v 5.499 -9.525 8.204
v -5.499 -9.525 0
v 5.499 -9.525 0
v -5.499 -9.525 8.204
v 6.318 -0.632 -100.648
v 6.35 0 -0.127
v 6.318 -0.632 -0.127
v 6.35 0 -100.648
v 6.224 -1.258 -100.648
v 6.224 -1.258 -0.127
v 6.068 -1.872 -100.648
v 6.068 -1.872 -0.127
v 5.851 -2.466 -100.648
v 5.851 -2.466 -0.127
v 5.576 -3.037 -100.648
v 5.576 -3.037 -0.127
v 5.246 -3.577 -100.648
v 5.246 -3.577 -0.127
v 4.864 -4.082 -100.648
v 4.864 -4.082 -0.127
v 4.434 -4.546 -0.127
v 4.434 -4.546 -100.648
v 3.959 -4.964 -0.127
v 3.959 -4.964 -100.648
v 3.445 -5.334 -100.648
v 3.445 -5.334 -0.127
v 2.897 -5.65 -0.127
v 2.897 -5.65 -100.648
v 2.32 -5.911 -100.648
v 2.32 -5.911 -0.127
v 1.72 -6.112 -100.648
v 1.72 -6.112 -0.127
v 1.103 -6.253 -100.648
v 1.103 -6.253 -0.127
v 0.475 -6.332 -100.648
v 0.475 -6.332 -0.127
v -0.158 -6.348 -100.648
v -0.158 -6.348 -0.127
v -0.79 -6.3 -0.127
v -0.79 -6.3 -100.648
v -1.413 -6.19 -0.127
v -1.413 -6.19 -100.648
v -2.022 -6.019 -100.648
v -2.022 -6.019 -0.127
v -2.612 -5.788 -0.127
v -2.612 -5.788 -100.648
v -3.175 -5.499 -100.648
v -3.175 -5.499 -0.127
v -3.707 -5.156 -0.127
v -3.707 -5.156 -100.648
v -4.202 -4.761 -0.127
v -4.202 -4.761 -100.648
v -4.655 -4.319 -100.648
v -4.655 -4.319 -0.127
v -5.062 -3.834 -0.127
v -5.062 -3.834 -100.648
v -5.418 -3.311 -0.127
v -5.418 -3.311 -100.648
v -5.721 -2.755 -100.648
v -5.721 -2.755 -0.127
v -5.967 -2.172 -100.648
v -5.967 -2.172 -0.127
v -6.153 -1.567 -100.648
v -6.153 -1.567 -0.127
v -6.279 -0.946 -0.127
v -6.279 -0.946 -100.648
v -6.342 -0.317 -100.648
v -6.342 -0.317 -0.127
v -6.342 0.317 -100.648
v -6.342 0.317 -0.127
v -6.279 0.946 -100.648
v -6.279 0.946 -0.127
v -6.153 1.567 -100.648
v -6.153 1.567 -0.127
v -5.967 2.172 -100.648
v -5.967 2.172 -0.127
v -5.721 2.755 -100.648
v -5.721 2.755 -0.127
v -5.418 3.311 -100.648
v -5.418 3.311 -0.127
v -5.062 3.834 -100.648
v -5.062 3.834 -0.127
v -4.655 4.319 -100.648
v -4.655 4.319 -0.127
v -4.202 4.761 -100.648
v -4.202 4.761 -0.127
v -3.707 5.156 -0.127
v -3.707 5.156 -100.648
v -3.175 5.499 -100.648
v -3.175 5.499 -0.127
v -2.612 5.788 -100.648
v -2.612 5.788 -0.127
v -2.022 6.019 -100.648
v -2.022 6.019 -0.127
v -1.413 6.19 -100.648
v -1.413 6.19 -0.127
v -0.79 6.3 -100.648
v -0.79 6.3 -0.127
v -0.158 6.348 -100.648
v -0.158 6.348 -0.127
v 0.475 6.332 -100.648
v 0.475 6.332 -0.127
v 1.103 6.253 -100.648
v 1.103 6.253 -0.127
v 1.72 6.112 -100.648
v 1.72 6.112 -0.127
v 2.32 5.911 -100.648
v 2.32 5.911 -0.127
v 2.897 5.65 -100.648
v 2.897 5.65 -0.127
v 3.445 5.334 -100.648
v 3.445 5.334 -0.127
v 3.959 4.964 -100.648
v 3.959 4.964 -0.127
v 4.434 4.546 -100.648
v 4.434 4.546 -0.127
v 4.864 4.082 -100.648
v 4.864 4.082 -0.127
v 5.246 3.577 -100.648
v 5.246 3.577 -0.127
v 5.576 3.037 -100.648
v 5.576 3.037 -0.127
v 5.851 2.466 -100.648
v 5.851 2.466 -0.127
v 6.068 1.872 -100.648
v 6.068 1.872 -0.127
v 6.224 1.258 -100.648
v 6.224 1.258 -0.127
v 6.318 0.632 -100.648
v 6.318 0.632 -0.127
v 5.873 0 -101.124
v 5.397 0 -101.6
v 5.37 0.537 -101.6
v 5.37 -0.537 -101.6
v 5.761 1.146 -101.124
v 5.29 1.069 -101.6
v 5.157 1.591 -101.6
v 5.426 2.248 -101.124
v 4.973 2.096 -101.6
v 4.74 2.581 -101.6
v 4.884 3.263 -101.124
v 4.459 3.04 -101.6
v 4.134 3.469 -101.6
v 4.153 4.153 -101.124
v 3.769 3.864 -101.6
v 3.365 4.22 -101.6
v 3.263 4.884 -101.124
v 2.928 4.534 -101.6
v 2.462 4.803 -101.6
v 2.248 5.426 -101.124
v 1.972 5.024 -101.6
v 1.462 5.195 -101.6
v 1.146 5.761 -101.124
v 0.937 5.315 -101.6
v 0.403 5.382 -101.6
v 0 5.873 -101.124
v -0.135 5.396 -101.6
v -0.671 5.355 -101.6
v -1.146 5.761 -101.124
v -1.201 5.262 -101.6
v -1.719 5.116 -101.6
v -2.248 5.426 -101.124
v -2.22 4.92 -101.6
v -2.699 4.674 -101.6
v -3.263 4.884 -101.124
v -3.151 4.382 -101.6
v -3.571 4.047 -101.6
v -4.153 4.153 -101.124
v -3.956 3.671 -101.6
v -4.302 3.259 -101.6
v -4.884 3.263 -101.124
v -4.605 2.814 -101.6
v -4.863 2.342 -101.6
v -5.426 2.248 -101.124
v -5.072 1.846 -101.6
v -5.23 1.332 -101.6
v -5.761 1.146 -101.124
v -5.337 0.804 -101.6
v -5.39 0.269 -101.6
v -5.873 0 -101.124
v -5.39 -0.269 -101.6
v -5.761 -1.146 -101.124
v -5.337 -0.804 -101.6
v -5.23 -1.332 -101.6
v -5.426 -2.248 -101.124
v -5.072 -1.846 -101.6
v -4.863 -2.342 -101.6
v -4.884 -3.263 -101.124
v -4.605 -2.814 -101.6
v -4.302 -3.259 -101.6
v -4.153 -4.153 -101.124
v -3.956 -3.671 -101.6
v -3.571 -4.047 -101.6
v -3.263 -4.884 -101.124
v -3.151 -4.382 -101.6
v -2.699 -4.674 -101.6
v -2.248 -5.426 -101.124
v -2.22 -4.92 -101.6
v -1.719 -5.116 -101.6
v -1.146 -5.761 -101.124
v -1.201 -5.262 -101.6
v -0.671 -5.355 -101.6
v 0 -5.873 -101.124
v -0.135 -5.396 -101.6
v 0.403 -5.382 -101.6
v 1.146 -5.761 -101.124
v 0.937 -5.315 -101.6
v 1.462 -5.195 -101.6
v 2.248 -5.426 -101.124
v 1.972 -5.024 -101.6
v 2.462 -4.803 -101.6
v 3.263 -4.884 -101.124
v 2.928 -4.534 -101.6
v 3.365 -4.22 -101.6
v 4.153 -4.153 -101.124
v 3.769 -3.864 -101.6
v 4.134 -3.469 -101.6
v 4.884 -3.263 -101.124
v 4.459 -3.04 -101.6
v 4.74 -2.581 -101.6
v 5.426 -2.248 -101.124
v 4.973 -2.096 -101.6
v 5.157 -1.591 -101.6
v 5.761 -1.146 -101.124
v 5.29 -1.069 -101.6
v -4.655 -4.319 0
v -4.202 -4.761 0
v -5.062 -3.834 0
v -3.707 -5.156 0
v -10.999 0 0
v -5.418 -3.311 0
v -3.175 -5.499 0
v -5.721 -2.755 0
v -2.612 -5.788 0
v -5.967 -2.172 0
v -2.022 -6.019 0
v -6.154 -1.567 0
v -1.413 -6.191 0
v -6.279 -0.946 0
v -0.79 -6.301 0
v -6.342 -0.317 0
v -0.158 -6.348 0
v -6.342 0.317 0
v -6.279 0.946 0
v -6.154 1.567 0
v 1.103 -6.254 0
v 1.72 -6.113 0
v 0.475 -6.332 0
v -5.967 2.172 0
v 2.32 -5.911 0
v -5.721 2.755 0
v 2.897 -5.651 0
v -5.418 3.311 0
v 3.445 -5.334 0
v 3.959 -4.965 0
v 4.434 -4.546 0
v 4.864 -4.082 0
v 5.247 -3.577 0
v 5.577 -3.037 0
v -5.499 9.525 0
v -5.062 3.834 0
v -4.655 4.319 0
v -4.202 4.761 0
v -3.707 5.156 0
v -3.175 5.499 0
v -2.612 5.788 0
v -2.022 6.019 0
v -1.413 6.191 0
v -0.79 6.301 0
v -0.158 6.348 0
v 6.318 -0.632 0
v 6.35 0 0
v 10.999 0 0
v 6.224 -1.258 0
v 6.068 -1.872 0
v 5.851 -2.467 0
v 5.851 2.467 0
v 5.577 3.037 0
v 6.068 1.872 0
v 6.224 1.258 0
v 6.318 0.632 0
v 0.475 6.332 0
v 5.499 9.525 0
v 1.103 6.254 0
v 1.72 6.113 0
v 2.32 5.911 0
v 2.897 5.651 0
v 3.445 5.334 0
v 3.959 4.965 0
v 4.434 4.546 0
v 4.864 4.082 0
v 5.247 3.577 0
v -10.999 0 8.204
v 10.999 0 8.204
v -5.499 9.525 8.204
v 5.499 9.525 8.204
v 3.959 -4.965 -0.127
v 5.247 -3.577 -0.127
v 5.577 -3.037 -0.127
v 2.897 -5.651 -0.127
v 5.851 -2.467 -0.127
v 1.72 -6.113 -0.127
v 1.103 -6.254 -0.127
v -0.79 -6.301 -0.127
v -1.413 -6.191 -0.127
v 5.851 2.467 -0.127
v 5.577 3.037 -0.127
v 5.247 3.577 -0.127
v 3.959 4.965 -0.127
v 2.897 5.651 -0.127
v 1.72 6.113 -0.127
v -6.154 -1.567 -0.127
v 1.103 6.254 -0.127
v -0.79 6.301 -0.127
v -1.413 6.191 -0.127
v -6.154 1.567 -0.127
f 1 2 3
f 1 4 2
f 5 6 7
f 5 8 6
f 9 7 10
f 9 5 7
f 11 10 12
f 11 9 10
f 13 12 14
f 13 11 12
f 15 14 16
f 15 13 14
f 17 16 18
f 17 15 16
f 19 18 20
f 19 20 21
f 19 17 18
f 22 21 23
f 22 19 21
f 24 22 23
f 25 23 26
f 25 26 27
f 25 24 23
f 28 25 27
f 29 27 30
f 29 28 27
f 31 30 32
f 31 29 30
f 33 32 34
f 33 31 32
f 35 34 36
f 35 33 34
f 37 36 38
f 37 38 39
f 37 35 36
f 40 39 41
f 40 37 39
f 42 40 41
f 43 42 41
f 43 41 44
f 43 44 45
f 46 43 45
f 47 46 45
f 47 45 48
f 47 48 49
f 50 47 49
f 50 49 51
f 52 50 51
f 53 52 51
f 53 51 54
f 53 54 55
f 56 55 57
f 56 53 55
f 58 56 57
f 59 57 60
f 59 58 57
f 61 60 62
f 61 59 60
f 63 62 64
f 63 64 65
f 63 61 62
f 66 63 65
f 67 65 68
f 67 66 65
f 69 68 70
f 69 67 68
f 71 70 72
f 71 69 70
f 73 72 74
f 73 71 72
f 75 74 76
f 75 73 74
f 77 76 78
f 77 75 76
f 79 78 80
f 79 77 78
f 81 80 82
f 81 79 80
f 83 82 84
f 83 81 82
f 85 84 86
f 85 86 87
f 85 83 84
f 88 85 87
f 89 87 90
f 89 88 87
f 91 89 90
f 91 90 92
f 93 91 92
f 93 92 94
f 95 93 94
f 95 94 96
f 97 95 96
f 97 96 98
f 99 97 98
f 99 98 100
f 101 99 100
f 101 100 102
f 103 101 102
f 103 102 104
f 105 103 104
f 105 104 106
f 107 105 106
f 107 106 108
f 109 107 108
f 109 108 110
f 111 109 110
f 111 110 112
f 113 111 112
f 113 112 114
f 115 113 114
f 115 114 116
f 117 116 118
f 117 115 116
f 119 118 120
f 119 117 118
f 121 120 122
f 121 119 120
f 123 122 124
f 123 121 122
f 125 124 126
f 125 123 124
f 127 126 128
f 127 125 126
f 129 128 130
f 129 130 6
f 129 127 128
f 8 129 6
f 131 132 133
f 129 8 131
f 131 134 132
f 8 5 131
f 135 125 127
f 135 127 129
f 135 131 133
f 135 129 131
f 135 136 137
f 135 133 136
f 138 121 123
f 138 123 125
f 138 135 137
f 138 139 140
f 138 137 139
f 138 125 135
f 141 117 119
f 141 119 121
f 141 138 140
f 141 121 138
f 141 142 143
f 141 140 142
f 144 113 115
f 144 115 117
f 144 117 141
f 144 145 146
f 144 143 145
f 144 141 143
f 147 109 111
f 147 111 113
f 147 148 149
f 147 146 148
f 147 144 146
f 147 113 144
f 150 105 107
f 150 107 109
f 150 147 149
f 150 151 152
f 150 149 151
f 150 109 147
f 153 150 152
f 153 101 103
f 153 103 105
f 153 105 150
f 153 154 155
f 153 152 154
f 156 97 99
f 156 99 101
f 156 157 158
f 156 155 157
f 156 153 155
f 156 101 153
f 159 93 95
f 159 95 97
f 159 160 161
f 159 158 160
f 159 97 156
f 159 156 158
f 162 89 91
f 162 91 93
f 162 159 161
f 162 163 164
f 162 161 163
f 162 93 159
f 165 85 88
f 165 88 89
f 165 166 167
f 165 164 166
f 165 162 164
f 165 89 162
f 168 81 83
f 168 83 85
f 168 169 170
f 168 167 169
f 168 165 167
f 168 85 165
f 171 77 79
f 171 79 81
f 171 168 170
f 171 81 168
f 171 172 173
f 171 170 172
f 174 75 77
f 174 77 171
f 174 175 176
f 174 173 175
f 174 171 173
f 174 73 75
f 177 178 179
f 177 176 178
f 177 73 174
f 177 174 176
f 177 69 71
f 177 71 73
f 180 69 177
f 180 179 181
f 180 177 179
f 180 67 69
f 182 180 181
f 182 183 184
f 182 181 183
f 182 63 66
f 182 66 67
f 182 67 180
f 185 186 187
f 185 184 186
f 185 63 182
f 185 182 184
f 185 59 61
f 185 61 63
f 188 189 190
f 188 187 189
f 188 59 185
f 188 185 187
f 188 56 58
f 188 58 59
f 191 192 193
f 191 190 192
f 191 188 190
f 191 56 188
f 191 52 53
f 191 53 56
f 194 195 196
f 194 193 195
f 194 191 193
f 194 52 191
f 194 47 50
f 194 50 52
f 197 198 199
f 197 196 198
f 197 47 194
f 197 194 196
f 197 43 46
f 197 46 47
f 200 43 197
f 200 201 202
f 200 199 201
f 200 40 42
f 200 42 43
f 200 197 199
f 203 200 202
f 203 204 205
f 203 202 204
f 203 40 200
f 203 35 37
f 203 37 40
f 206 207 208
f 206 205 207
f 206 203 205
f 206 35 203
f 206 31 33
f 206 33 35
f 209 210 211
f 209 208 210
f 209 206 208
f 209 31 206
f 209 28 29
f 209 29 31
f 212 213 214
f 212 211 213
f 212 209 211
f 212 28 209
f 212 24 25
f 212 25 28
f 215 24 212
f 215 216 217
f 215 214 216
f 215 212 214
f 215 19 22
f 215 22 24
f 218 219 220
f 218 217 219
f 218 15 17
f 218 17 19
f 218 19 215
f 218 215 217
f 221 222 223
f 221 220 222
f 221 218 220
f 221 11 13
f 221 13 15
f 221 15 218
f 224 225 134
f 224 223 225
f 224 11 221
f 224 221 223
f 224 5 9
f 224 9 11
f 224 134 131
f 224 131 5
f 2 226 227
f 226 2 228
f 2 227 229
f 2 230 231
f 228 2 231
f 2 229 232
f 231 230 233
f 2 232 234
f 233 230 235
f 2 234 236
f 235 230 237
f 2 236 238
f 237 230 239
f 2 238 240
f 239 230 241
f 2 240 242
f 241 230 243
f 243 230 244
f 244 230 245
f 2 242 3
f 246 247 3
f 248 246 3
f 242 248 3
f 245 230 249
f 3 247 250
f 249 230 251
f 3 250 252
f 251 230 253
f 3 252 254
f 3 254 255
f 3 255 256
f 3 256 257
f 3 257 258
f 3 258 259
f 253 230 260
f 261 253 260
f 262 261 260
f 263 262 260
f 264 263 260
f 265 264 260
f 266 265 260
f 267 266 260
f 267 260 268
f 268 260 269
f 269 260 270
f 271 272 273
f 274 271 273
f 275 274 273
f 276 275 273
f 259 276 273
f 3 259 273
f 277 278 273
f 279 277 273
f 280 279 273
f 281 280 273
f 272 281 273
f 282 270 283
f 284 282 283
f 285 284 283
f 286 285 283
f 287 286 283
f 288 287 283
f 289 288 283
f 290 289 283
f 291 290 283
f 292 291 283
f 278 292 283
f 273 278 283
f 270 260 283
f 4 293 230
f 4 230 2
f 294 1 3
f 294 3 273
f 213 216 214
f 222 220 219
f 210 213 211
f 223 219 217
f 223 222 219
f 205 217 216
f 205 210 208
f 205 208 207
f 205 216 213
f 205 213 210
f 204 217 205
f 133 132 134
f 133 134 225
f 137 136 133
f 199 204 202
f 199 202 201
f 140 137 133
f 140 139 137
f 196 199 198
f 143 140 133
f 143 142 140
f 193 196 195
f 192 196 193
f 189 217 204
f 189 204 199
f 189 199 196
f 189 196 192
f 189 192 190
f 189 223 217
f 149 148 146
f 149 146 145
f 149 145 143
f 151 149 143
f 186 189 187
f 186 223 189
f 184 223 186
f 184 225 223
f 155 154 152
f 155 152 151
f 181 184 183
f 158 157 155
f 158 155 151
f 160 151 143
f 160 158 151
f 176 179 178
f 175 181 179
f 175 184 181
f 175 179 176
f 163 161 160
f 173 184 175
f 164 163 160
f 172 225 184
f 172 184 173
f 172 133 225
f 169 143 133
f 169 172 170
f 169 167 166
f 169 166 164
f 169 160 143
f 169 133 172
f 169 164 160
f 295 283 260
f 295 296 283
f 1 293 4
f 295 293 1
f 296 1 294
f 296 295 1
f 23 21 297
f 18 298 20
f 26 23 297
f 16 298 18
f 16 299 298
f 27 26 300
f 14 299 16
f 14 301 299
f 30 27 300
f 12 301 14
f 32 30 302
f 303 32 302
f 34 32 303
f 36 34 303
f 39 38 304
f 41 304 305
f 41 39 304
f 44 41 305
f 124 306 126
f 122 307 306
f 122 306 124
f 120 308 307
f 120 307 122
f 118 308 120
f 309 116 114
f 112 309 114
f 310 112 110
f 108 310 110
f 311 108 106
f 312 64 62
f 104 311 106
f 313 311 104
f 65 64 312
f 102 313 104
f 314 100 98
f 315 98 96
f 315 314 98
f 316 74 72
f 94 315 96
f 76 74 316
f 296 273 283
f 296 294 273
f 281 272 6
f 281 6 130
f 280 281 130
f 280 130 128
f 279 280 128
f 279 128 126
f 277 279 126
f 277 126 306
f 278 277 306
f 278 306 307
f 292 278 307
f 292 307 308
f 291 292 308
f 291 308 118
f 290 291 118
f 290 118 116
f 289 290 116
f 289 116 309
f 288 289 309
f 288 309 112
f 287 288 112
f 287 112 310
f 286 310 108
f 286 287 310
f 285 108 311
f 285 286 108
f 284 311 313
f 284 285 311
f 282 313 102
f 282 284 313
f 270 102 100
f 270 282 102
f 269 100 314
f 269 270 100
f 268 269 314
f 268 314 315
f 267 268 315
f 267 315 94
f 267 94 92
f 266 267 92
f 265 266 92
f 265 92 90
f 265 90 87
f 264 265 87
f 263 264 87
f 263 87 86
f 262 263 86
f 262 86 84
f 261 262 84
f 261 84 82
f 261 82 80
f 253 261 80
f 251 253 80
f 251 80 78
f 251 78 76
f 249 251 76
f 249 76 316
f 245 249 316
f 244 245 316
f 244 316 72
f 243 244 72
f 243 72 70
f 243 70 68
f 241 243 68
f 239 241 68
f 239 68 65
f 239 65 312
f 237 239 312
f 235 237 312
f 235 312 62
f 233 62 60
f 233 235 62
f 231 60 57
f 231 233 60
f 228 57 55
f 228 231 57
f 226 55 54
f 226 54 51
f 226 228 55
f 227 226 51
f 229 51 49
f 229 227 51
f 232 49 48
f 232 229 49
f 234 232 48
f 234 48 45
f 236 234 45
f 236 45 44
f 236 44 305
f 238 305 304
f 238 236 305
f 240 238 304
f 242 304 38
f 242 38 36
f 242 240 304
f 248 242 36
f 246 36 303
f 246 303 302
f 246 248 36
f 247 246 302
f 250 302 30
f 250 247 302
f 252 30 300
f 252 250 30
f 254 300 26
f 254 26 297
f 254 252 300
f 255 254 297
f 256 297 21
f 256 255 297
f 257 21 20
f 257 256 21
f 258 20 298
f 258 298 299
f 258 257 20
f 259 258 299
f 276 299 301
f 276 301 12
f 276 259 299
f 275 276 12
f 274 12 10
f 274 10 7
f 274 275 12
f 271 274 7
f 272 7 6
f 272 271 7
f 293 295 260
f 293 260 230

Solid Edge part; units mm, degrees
sketch "Sketch1" plane through (0, 0, 0) normal (0, 0, 1) x (1, 0, 0)
  circle A0 centre (0, 0) radius 11.049
  dimension "D1" = 22.098
extrude "Protrusion1" add sketch "Sketch1" along normal blind 8.2042
sketch "Sketch2" plane through (0, 0, 0) normal (0, 0, -1) x (1, 0, 0)
  circle A0 centre (0, 0) radius 6.35
extrude "Protrusion2" add sketch "Sketch2" along normal blind 101.6
sketch "Sketch3" plane through (0, 0, -101.6) normal (0, 0, -1) x (1, 0, 0)
  circle A0 centre (0, 0) radius 6.3497
extrude "Cutout1" cut sketch "Sketch3" against normal blind 101.473 flip side to cut
chamfer "Chamfer_1" distance 0.9525 angle 45 1 edges at (-6.3497, 0, -101.6)
sketch "Sketch4" plane through (0, 0, 8.2042) normal (0, 0, 1) x (1, 0, 0)
  line L0 (-5.5995, 9.525) -> (5.5995, 9.525)
  dimension "D1" = 19.05
extrude "Cutout2" cut sketch "Sketch4" against normal up to next material side at (0, 9.575, 8.2042)
pattern_circular "Pattern1" count 6 over 360 about axis through (0, 0, 8.2042) along (0, 0, 1) of "Cutout2"
properties part number "159699"
